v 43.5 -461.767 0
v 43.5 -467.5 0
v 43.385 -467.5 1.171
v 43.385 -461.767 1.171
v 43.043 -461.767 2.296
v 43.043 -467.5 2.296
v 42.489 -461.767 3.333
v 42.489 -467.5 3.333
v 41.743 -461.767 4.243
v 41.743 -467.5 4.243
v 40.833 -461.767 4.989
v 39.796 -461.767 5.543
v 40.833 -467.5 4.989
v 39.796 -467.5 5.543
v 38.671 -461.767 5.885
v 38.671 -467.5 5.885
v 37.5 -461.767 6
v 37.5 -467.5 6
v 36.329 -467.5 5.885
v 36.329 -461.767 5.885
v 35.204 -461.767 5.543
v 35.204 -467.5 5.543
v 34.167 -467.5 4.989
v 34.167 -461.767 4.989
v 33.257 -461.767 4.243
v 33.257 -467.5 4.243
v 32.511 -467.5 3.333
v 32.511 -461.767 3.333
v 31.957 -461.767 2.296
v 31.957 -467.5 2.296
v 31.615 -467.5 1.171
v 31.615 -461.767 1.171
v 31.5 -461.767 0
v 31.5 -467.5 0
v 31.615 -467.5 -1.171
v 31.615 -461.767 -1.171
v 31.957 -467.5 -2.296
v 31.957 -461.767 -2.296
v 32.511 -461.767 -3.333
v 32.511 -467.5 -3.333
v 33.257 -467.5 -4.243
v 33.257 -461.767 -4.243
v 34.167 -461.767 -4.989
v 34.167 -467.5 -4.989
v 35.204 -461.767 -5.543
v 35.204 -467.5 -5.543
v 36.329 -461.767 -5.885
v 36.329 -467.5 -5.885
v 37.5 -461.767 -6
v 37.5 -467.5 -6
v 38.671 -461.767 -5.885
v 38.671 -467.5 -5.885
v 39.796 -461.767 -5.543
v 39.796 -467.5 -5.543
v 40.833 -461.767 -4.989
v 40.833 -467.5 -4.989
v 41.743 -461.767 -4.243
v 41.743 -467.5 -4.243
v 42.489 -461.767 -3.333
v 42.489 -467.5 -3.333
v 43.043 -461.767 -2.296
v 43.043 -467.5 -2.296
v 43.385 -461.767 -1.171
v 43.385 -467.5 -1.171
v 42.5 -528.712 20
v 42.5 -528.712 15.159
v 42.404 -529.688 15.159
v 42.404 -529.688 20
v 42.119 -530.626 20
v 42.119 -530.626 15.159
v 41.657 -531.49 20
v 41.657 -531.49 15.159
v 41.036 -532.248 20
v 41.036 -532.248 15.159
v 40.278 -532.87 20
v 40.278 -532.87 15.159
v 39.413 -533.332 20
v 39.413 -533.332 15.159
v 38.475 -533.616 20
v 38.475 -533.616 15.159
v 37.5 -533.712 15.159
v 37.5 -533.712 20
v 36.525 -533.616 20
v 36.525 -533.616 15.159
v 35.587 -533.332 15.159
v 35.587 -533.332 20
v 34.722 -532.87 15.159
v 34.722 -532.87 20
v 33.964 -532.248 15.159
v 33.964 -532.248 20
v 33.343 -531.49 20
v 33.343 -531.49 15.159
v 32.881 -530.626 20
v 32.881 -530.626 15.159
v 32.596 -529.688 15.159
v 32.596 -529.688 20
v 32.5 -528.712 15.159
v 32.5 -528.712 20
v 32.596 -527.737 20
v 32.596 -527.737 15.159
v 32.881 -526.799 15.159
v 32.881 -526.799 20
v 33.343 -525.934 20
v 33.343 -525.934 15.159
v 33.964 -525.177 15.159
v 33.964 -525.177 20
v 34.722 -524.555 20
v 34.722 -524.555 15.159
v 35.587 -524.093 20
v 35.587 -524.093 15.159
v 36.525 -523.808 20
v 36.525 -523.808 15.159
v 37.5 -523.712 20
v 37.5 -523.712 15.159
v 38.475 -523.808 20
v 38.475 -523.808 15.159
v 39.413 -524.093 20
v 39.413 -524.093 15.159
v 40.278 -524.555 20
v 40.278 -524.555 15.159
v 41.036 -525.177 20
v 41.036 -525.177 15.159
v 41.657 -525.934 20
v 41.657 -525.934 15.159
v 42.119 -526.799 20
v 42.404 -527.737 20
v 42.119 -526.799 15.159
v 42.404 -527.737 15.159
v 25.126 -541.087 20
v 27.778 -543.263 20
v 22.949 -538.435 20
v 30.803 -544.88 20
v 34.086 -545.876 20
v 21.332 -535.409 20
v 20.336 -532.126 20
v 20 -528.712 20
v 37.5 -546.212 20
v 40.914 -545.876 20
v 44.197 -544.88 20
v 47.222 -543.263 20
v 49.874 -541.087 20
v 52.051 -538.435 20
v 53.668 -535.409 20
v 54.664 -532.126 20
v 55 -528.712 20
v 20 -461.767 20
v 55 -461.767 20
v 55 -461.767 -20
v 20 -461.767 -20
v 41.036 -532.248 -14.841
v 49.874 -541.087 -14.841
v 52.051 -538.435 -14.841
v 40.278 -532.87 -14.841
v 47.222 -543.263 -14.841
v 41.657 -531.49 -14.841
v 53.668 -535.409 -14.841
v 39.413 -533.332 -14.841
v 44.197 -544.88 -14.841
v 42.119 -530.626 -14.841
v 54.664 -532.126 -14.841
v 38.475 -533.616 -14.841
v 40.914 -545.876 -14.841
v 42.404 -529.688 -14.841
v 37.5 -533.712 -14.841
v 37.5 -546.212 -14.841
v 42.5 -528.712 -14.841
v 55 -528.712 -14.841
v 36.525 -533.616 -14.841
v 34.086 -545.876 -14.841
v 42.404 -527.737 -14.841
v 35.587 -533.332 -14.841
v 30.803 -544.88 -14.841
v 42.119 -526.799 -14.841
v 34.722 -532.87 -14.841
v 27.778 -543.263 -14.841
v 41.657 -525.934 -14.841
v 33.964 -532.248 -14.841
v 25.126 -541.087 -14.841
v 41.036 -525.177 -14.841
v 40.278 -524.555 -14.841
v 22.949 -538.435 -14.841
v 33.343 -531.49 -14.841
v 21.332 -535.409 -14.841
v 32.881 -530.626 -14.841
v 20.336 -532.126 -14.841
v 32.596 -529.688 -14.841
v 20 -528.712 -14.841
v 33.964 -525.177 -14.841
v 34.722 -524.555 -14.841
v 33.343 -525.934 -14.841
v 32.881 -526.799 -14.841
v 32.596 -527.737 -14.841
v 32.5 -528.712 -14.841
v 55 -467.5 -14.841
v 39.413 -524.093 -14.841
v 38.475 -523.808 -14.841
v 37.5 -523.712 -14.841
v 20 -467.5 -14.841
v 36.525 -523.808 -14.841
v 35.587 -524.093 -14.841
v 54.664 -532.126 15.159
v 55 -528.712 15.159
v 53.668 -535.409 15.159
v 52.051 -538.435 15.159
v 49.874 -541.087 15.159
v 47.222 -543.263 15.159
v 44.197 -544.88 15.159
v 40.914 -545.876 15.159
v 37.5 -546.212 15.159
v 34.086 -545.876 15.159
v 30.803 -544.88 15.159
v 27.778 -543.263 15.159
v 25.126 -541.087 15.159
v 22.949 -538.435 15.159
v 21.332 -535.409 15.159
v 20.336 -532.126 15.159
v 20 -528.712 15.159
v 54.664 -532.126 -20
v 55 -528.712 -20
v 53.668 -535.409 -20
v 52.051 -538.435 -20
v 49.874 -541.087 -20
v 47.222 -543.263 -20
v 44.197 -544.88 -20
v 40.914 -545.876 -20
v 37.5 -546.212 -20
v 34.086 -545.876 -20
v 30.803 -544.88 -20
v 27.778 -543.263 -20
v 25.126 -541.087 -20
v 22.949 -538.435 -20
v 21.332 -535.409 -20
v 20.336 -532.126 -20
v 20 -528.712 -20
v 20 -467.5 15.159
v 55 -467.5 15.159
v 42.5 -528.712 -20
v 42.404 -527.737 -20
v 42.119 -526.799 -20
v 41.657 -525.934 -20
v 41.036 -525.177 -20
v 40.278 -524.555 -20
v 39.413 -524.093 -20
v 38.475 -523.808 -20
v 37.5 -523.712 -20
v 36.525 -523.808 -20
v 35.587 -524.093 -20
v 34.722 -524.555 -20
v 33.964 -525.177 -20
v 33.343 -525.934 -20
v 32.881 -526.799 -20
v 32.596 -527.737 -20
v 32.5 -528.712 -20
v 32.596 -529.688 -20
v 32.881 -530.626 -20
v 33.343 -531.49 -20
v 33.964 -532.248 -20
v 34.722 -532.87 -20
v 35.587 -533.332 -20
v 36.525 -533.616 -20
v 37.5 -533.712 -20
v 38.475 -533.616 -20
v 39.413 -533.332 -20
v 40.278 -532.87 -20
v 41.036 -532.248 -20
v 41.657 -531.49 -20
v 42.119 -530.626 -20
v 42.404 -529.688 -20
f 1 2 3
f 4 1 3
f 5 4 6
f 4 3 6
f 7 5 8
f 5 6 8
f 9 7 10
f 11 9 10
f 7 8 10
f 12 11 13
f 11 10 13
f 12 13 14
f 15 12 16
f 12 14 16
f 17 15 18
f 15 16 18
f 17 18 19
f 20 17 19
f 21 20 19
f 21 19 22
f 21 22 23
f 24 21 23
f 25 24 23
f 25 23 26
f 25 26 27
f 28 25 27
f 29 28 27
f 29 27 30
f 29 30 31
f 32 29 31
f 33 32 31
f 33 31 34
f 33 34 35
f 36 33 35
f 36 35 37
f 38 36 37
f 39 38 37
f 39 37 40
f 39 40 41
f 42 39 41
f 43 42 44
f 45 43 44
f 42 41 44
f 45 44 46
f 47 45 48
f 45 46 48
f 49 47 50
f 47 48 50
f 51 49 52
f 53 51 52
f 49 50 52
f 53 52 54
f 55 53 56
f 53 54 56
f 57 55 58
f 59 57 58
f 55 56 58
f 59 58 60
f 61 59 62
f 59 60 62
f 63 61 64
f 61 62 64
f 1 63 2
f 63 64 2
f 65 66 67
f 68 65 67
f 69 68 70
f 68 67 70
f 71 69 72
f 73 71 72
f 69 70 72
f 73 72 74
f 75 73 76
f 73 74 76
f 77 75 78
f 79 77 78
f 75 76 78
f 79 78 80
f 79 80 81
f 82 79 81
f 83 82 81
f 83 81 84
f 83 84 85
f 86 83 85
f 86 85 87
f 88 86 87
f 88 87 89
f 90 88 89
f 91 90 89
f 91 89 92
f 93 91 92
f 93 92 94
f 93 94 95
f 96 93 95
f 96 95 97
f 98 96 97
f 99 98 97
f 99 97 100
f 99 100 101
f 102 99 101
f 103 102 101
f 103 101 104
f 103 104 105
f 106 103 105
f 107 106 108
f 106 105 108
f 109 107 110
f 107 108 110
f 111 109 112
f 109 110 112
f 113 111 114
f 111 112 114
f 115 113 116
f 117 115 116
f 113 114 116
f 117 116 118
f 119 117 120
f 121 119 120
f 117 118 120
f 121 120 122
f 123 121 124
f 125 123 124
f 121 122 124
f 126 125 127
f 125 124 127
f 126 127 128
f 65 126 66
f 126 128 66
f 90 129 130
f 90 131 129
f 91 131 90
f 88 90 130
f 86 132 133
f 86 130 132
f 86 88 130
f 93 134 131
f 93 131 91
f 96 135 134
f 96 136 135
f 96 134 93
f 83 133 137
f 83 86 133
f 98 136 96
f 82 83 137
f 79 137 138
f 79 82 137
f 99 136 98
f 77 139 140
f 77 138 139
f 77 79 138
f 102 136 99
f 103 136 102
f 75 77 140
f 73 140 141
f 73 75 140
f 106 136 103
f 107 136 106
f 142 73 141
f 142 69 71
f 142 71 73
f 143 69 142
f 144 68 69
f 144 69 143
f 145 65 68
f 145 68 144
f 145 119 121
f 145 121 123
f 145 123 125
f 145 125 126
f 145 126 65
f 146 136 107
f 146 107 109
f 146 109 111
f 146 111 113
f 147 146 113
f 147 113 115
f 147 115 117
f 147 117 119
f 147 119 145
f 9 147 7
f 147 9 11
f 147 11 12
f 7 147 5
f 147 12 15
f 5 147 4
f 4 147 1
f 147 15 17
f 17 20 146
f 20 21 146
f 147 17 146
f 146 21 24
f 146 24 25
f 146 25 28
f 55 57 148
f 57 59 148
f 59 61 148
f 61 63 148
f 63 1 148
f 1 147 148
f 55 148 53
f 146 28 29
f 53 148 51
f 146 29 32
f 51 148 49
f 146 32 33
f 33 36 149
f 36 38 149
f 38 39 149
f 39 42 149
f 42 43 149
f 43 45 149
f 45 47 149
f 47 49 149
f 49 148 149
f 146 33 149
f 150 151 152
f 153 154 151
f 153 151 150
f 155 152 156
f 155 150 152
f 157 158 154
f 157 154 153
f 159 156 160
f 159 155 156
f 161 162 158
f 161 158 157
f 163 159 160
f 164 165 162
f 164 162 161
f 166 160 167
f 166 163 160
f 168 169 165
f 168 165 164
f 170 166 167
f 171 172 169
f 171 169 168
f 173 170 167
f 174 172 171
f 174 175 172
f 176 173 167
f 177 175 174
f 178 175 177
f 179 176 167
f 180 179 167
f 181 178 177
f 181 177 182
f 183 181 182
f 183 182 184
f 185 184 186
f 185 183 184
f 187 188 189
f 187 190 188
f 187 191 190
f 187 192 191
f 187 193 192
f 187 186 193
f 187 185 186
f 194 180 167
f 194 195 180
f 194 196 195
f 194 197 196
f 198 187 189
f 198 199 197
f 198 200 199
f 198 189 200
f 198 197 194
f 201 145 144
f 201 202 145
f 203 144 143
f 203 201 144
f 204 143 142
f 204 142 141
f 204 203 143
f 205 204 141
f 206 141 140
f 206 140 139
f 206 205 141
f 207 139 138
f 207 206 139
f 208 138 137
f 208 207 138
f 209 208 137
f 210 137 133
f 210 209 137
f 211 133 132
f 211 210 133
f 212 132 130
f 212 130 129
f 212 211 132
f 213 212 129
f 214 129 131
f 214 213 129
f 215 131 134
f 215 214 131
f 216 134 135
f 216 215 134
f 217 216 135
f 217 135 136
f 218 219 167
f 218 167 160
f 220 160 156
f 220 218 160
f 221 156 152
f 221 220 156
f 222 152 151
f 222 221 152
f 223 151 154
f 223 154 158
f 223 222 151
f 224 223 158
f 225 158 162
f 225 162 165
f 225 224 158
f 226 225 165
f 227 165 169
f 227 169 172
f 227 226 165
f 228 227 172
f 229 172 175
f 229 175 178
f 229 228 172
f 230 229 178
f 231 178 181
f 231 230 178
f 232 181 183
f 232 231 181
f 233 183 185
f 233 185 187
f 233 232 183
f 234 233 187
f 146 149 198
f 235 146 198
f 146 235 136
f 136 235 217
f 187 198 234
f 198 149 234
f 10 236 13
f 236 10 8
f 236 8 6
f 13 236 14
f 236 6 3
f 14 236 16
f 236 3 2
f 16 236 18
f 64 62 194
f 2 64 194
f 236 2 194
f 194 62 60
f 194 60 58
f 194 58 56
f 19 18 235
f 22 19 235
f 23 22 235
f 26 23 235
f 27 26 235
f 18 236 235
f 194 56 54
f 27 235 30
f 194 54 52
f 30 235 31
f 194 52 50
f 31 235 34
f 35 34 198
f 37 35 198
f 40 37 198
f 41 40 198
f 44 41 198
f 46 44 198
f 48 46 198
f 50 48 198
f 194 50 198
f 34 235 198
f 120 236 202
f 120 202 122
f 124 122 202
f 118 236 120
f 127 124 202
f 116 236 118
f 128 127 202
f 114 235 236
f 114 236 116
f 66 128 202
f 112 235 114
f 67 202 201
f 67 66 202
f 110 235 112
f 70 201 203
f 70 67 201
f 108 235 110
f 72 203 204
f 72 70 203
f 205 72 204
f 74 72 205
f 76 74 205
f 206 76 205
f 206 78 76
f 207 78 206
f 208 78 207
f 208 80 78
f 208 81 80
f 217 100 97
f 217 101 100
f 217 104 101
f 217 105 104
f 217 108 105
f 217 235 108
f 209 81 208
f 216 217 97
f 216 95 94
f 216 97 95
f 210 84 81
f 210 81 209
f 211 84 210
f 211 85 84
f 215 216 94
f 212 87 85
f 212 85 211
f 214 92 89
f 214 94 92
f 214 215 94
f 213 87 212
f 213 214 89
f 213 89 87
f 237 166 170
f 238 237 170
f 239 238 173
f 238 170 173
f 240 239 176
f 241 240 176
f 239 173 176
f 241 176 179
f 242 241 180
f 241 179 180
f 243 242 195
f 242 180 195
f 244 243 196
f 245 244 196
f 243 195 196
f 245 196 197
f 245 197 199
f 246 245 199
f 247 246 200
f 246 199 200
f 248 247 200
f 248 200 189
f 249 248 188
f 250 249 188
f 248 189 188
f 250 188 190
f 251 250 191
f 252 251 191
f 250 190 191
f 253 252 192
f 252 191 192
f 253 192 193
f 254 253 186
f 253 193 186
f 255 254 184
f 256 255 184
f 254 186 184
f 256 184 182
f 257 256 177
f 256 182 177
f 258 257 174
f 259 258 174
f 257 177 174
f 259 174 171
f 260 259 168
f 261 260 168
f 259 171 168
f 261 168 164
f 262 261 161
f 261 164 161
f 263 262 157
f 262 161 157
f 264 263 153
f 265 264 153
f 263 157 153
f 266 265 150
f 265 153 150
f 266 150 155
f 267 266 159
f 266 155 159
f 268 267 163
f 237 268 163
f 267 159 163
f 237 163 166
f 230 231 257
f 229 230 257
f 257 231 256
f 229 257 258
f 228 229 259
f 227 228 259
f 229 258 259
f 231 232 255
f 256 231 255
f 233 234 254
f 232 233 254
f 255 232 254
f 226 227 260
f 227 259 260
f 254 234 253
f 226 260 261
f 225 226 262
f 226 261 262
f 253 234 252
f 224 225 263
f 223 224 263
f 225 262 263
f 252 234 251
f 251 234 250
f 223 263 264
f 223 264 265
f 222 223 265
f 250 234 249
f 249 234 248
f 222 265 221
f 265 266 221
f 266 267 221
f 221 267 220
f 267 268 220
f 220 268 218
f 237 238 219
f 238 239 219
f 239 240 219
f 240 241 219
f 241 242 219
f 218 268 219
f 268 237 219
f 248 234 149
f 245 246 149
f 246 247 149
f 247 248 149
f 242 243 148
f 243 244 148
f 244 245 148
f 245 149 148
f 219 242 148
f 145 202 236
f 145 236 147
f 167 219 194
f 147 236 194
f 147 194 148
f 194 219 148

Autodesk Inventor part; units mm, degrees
ref_plane "YZ Plane" through (0, 0, 0) normal (1, 0, 0) x (0, 1, 0)
ref_plane "XZ Plane" through (0, 0, 0) normal (0, 1, 0) x (-1, 0, 0)
ref_plane "XY Plane" through (0, 0, 0) normal (0, 0, 1) x (1, 0, 0)
ref_plane "Work Plane1" through (0, 0, 0) normal (0, 0, 1) x (1, 0, 0)
sketch "Sketch1" plane through (0, 0, 0) normal (0, 0, 1) x (1, 0, 0)
  line L0 (55, -528.7123) -> (55, -461.767)
  line L1 (55, -461.767) -> (20, -461.767)
  line L2 (20, -461.767) -> (20, -528.7123)
  arc A0 (20, -528.7123) -> (55, -528.7123) centre (37.5, -528.7123) ccw
  line L3 (43.5, -461.767) -> (31.5, -461.767) projected
  line L4 (37.5, -461.767) -> (37.5, -485.2876) construction
  arc A1 (30.6824, -513.1447) -> (23.108, -519.6737) centre (26.8952, -516.4092) ccw projected
  line L5 (88.3973, -595.4186) -> (23.108, -519.6737) projected
  line L6 (30.6824, -513.1447) -> (95.9718, -588.8897) projected
  arc A2 (88.3973, -595.4186) -> (95.9718, -588.8897) centre (92.1846, -592.1541) ccw projected
  line L7 (92.1846, -592.1541) -> (26.8952, -516.4092) construction
  circle A3 centre (37.5, -528.7123) radius 5
  point P0 (0, 0)
  dimension "d0" = 23.5206
  dimension "d1" = 35
extrude "Extrusion1" add sketch "Sketch1" along normal mid plane 40 contours A0 L6 A1 L5 L2 L1 L0 | A0 L5 A3 L6 | A3 L5 A1 L6
sketch "Sketch2" plane through (20, -528.7123, 20) normal (-1, 0, 0) x (0, 0, 1)
  line L0 (-11, 54.2123) -> (-29, 54.2123) projected
  line L1 (-11, 61.2123) -> (-29, 61.2123) projected
  line L2 (-34.8412, -128.9954) -> (-34.8412, 22.4945) projected
  line L3 (-4.8412, 22.4945) -> (-4.8412, -128.9954) projected
  line L4 (-40, -17.5) -> (0, -17.5) projected
  line L5 (-4.8412, -17.5) -> (-4.8412, 61.2123)
  line L6 (-4.8412, 61.2123) -> (-34.8412, 61.2123)
  line L7 (-34.8412, 61.2123) -> (-34.8412, -17.5)
  point P0 (-20, 528.7123)
  point P1 (-34.8412, 22.4945)
  point P2 (-29, 61.2123)
extrude "Extrusion2" cut sketch "Sketch2" against normal through all
sketch "Sketch3" plane through (20, -467.5, -14.8412) normal (0, -1, 0) x (1, 0, 0)
  circle A0 centre (17.5, 14.8412) radius 6 projected
  point P0 (-20, 14.8412)
extrude "Extrusion3" cut sketch "Sketch3" against normal through all
properties part number "Junta Revoluta"
